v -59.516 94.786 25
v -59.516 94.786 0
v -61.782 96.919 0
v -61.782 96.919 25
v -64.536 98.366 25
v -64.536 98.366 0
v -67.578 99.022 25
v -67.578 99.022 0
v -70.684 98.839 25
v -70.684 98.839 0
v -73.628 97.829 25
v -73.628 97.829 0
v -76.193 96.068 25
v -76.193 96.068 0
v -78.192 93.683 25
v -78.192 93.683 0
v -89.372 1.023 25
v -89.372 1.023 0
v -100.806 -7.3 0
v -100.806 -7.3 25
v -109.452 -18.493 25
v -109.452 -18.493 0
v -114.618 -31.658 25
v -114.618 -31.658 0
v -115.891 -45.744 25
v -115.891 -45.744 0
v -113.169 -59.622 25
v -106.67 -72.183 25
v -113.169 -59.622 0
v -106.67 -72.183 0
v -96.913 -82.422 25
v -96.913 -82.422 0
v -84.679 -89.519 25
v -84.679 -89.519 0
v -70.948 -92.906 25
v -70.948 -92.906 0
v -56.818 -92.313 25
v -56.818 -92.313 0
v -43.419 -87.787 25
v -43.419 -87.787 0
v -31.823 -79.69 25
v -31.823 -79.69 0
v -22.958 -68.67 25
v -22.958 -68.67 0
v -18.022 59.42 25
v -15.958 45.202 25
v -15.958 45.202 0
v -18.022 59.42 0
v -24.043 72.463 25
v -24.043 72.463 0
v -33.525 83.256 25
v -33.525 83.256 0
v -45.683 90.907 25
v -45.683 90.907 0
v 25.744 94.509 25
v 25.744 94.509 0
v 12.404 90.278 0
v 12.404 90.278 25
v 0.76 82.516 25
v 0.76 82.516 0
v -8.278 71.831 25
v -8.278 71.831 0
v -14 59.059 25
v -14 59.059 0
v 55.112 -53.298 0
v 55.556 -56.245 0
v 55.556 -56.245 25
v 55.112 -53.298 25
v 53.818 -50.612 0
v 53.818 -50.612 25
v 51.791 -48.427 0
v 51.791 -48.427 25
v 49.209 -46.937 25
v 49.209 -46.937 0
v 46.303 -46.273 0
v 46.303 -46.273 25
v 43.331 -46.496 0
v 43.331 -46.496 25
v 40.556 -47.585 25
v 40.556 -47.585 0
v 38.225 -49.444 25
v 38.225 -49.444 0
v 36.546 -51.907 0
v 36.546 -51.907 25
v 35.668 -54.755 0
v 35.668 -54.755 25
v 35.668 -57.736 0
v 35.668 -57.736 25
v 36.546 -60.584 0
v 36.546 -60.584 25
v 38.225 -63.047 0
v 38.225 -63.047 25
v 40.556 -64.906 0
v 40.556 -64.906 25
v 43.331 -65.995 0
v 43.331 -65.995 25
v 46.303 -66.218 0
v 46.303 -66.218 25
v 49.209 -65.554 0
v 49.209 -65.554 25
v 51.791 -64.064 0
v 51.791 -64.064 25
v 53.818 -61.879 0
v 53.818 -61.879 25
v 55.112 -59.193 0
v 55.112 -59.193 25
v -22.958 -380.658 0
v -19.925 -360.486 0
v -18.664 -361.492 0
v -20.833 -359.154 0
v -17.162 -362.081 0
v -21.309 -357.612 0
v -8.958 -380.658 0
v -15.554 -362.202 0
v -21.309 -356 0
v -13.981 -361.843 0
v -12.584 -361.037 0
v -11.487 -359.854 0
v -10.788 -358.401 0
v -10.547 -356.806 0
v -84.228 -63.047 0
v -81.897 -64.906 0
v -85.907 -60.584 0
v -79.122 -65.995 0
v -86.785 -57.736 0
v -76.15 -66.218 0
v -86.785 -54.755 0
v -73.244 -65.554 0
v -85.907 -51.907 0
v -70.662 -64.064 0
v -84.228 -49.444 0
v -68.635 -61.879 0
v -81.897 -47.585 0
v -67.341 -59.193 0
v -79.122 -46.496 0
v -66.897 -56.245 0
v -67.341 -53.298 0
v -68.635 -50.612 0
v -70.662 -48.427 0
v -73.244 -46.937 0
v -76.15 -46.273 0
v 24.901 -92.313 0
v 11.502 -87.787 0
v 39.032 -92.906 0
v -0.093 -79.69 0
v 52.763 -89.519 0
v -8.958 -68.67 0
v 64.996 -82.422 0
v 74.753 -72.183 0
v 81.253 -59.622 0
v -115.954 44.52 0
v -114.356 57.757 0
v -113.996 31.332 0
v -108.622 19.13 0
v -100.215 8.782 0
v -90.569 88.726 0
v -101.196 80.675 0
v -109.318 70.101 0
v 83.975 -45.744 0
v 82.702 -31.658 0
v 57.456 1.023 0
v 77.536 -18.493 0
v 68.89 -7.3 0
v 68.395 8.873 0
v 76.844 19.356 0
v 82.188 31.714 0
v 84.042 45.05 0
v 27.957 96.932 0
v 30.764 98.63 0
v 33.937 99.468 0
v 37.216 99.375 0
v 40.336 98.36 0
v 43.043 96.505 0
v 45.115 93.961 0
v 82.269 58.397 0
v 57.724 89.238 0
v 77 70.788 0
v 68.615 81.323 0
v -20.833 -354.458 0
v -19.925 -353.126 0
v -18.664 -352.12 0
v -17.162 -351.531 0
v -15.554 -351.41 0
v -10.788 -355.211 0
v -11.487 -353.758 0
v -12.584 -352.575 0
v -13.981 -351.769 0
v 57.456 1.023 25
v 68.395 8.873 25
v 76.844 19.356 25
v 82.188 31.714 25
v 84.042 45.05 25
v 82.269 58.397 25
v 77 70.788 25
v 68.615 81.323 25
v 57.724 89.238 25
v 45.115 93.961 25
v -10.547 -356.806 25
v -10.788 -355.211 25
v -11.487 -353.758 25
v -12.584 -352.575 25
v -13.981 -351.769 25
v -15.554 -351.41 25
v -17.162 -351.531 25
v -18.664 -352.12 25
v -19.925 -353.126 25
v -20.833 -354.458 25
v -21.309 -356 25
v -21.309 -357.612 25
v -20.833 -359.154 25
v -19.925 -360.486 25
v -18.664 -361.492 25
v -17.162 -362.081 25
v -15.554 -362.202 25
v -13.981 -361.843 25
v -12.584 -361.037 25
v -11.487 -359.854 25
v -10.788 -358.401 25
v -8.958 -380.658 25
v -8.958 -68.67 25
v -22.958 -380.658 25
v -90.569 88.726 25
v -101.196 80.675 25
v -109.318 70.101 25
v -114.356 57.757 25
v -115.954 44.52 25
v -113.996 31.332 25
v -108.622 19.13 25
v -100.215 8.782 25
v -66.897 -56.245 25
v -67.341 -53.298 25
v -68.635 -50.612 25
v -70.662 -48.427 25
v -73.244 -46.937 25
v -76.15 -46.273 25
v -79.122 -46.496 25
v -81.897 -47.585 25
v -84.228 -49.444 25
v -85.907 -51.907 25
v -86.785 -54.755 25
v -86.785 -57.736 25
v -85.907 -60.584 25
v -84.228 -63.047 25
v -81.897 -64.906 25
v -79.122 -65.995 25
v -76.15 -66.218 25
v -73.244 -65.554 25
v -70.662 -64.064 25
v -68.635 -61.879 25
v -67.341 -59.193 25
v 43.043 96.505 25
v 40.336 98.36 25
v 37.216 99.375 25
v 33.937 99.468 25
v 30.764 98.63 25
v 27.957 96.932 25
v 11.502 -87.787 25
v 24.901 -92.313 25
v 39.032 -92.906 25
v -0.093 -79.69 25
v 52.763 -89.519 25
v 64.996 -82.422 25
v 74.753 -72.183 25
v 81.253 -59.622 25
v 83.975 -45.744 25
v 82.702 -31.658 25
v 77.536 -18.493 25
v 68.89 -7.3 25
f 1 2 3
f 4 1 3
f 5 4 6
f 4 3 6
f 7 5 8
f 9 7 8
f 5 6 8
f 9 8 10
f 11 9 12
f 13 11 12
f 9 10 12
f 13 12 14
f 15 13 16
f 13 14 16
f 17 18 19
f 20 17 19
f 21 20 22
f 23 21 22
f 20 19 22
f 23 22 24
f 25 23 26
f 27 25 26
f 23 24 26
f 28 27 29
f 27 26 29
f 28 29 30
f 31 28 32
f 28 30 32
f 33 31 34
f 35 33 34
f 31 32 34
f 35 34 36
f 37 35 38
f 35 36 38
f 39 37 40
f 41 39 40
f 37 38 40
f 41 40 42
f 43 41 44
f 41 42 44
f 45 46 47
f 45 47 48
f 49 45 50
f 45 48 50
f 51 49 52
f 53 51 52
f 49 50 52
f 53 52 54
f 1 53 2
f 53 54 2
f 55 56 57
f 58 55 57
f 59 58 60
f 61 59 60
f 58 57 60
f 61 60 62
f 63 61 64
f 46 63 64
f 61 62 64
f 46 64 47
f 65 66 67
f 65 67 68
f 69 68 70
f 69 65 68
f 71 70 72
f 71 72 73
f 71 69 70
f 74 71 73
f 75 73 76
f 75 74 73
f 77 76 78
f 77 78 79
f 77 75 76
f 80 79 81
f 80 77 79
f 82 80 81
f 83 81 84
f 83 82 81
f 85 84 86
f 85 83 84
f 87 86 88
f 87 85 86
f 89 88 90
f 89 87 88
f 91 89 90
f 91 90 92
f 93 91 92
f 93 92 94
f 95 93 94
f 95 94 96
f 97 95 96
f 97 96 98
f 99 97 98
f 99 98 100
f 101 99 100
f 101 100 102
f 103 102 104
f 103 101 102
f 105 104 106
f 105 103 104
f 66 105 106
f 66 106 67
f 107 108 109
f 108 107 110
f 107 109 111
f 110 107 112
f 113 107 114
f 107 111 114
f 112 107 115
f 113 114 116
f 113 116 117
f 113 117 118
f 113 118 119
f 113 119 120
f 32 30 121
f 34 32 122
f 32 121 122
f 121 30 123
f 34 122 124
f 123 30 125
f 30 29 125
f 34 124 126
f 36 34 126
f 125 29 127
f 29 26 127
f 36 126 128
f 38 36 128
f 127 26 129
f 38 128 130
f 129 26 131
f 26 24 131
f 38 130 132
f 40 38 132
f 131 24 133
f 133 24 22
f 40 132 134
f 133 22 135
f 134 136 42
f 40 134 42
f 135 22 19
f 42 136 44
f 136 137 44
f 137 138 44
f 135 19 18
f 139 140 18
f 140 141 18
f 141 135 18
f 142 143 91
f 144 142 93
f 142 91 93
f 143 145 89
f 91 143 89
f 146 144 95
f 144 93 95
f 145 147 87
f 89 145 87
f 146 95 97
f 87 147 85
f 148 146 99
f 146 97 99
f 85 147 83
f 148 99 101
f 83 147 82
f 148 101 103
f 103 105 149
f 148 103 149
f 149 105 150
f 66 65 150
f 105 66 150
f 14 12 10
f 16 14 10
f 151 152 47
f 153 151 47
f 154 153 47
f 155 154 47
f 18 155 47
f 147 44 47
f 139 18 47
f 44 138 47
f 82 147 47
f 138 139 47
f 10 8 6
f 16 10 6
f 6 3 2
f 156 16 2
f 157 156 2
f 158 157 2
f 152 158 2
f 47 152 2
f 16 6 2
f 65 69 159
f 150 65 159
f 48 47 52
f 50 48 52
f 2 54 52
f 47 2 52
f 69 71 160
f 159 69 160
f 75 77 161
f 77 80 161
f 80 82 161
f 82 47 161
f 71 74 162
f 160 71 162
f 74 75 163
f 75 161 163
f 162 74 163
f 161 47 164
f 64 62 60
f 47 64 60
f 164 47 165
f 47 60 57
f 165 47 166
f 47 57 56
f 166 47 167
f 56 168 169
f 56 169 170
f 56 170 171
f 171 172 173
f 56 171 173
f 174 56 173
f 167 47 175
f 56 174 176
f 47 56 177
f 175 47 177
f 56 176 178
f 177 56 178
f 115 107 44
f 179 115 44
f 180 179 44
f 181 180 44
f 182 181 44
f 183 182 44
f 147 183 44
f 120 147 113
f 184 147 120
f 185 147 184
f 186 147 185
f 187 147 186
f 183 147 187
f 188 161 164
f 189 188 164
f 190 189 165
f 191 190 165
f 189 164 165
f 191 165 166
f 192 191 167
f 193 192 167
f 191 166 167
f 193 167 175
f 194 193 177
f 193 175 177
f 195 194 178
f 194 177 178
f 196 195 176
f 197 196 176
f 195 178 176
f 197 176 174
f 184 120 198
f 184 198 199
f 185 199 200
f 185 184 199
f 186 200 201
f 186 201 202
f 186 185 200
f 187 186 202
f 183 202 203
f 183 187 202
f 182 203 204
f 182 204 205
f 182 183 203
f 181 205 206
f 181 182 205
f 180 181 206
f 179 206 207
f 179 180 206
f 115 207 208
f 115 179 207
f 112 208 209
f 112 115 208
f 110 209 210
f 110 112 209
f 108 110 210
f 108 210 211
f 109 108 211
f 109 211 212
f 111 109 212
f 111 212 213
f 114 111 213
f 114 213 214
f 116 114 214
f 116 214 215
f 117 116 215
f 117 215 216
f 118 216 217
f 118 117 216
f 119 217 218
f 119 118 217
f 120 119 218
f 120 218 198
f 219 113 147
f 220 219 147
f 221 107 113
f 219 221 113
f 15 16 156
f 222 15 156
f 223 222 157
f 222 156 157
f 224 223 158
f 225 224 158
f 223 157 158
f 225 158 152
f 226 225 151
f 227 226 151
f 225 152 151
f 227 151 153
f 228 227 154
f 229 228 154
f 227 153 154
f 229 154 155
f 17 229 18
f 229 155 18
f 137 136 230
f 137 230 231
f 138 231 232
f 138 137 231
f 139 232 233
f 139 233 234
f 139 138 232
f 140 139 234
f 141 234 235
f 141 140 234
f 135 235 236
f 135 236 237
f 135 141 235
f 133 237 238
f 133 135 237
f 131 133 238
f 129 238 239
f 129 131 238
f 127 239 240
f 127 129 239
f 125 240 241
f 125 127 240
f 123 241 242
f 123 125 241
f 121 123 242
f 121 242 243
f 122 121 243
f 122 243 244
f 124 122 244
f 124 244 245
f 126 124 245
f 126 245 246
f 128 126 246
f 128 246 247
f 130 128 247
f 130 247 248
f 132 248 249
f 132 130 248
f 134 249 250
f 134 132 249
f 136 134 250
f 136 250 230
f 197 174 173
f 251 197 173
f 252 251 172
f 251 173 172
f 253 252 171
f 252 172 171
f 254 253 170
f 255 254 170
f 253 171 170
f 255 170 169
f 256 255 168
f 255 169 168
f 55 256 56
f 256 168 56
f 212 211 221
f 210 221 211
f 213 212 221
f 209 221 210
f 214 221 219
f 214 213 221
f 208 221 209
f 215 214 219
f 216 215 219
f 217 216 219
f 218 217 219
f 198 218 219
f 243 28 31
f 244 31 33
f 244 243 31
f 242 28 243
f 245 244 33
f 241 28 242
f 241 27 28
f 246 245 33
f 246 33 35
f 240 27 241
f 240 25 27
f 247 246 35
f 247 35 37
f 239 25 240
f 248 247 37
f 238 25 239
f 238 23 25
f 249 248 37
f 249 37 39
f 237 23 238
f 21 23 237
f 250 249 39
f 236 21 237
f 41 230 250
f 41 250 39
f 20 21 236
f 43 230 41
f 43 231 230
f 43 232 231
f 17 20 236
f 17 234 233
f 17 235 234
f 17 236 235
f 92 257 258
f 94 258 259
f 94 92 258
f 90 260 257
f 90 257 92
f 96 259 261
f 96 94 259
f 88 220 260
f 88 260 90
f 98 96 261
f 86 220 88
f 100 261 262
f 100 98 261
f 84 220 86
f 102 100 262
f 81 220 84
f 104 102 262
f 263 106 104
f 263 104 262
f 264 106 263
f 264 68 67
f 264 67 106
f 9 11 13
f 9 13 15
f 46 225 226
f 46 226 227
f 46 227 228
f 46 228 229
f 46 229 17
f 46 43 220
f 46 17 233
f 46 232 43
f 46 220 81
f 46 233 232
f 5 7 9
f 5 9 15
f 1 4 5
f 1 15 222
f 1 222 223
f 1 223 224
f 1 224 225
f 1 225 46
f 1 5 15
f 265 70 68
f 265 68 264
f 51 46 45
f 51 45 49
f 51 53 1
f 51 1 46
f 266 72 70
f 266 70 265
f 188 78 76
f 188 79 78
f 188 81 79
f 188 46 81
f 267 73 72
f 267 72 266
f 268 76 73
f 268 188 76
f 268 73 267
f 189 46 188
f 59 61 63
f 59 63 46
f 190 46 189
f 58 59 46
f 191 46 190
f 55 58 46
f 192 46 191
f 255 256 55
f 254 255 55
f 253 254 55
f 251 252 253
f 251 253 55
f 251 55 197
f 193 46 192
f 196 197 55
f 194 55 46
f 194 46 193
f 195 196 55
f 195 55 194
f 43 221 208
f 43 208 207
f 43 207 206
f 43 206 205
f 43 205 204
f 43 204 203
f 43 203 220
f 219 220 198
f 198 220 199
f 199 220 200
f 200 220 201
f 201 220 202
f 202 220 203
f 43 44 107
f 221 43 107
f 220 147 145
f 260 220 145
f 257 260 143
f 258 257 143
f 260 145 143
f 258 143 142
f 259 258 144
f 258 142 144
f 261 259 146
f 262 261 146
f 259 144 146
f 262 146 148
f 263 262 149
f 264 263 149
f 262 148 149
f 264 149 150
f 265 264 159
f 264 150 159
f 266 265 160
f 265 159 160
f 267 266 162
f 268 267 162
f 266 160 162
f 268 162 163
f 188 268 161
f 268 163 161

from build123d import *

# Parameters (mm, degrees)
F0_R     = 10
F0_R_2   = 5.4110615761
F1_DEPTH = 25
F2_DEPTH = 25


with BuildPart() as f1:
    # F0 (on Top) → F1 (new body)
    with BuildSketch(Plane.XY):
        with BuildLine():
            Line((-56.9581672003, 45.2024476719), (-15.9581672003, 45.2024476719))
            ThreePointArc((-15.9581672003, 45.2024476719), (-28.3942012079, 78.2016667372), (-59.5161055572, 94.7857093817))
            ThreePointArc((-59.5161055572, 94.7857093817), (-69.1375376467, 99.0362543602), (-78.191763881, 93.6827437957))
            ThreePointArc((-78.191763881, 93.6827437957), (-115.5981273519, 51.1919681993), (-89.3719782194, 1.0233411444))
            ThreePointArc((-89.3719782194, 1.0233411444), (-102.1550099365, -77.6490774294), (-22.9581672003, -68.6704670274))
            ThreePointArc((-22.9581672003, -68.6704670274), (-17.7399133953, -56.3845219384), (-15.9581672003, -43.1557653831))
            Line((-15.9581672003, -43.1557653831), (-56.9581672003, -43.1557653831))
            ThreePointArc((-56.9581672003, -43.1557653831), (-63.322128231, -40.5197264137), (-65.9581672003, -34.1557653831))
            Line((-65.9581672003, -34.1557653831), (-65.9581672003, 36.2024476719))
            ThreePointArc((-65.9581672003, 36.2024476719), (-63.322128231, 42.5664087025), (-56.9581672003, 45.2024476719))
        make_face()
        with Locations((-76.8970996141, -56.245483458)):
            Circle(F0_R, mode=Mode.SUBTRACT)
        with BuildLine():
            Line((25.0418327997, 45.2024476719), (-15.9581672003, 45.2024476719))
            Line((-15.9581672003, 45.2024476719), (-56.9581672003, 45.2024476719))
            ThreePointArc((-56.9581672003, 45.2024476719), (-63.322128231, 42.5664087025), (-65.9581672003, 36.2024476719))
            Line((-65.9581672003, 36.2024476719), (-65.9581672003, -34.1557653831))
            ThreePointArc((-65.9581672003, -34.1557653831), (-63.322128231, -40.5197264137), (-56.9581672003, -43.1557653831))
            Line((-56.9581672003, -43.1557653831), (-15.9581672003, -43.1557653831))
            Line((-15.9581672003, -43.1557653831), (25.0418327997, -43.1557653831))
            ThreePointArc((25.0418327997, -43.1557653831), (31.4057938304, -40.5197264137), (34.0418327997, -34.1557653831))
            Line((34.0418327997, -34.1557653831), (34.0418327997, 36.2024476719))
            ThreePointArc((34.0418327997, 36.2024476719), (31.4057938304, 42.5664087025), (25.0418327997, 45.2024476719))
        make_face()
        with BuildLine():
            ThreePointArc((25.7441905011, 94.5091321303), (-4.1346135706, 77.4911290097), (-15.9581672003, 45.2024476719))
            Line((-15.9581672003, 45.2024476719), (25.0418327997, 45.2024476719))
            ThreePointArc((25.0418327997, 45.2024476719), (31.4057938304, 42.5664087025), (34.0418327997, 36.2024476719))
            Line((34.0418327997, 36.2024476719), (34.0418327997, -34.1557653831))
            ThreePointArc((34.0418327997, -34.1557653831), (31.4057938304, -40.5197264137), (25.0418327997, -43.1557653831))
            Line((25.0418327997, -43.1557653831), (-15.9581672003, -43.1557653831))
            ThreePointArc((-15.9581672003, -43.1557653831), (-14.1764210053, -56.3845219384), (-8.9581672003, -68.6704670274))
            ThreePointArc((-8.9581672003, -68.6704670274), (70.2386755359, -77.6490774294), (57.4556438187, 1.0233411444))
            ThreePointArc((57.4556438187, 1.0233411444), (83.6067922706, 51.7838451407), (45.1150959261, 93.9608607278))
            ThreePointArc((45.1150959261, 93.9608607278), (35.5797605926, 99.5387739728), (25.7441905011, 94.5091321303))
        make_face()
        with Locations((45.5559305847, -56.245483458)):
            Circle(F0_R, mode=Mode.SUBTRACT)
        with BuildLine():
            ThreePointArc((-15.9581672003, -43.1557653831), (-17.7399133953, -56.3845219384), (-22.9581672003, -68.6704670274))
            Line((-22.9581672003, -68.6704670274), (-22.9581672003, -234.5025837421))
            Line((-22.9581672003, -234.5025837421), (-22.9581672003, -380.6582093239))
            Line((-22.9581672003, -380.6582093239), (-8.9581672003, -380.6582093239))
            Line((-8.9581672003, -380.6582093239), (-8.9581672003, -234.5025837421))
            Line((-8.9581672003, -234.5025837421), (-8.9581672003, -68.6704670274))
            ThreePointArc((-8.9581672003, -68.6704670274), (-14.1764210053, -56.3845219384), (-15.9581672003, -43.1557653831))
        make_face()
        with Locations((-15.9581672003, -356.8059802055)):
            Circle(F0_R_2, mode=Mode.SUBTRACT)
    extrude(amount=F1_DEPTH)

    # F0 (on Top) → F2 (join)
    with BuildSketch(Plane.XY):
        with BuildLine():
            Line((-56.9581672003, 45.2024476719), (-15.9581672003, 45.2024476719))
            ThreePointArc((-15.9581672003, 45.2024476719), (-28.3942012079, 78.2016667372), (-59.5161055572, 94.7857093817))
            ThreePointArc((-59.5161055572, 94.7857093817), (-69.1375376467, 99.0362543602), (-78.191763881, 93.6827437957))
            ThreePointArc((-78.191763881, 93.6827437957), (-115.5981273519, 51.1919681993), (-89.3719782194, 1.0233411444))
            ThreePointArc((-89.3719782194, 1.0233411444), (-102.1550099365, -77.6490774294), (-22.9581672003, -68.6704670274))
            ThreePointArc((-22.9581672003, -68.6704670274), (-17.7399133953, -56.3845219384), (-15.9581672003, -43.1557653831))
            Line((-15.9581672003, -43.1557653831), (-56.9581672003, -43.1557653831))
            ThreePointArc((-56.9581672003, -43.1557653831), (-63.322128231, -40.5197264137), (-65.9581672003, -34.1557653831))
            Line((-65.9581672003, -34.1557653831), (-65.9581672003, 36.2024476719))
            ThreePointArc((-65.9581672003, 36.2024476719), (-63.322128231, 42.5664087025), (-56.9581672003, 45.2024476719))
        make_face()
        with Locations((-76.8970996141, -56.245483458)):
            Circle(F0_R, mode=Mode.SUBTRACT)
        with BuildLine():
            Line((25.0418327997, 45.2024476719), (-15.9581672003, 45.2024476719))
            Line((-15.9581672003, 45.2024476719), (-56.9581672003, 45.2024476719))
            ThreePointArc((-56.9581672003, 45.2024476719), (-63.322128231, 42.5664087025), (-65.9581672003, 36.2024476719))
            Line((-65.9581672003, 36.2024476719), (-65.9581672003, -34.1557653831))
            ThreePointArc((-65.9581672003, -34.1557653831), (-63.322128231, -40.5197264137), (-56.9581672003, -43.1557653831))
            Line((-56.9581672003, -43.1557653831), (-15.9581672003, -43.1557653831))
            Line((-15.9581672003, -43.1557653831), (25.0418327997, -43.1557653831))
            ThreePointArc((25.0418327997, -43.1557653831), (31.4057938304, -40.5197264137), (34.0418327997, -34.1557653831))
            Line((34.0418327997, -34.1557653831), (34.0418327997, 36.2024476719))
            ThreePointArc((34.0418327997, 36.2024476719), (31.4057938304, 42.5664087025), (25.0418327997, 45.2024476719))
        make_face()
        with BuildLine():
            ThreePointArc((25.7441905011, 94.5091321303), (-4.1346135706, 77.4911290097), (-15.9581672003, 45.2024476719))
            Line((-15.9581672003, 45.2024476719), (25.0418327997, 45.2024476719))
            ThreePointArc((25.0418327997, 45.2024476719), (31.4057938304, 42.5664087025), (34.0418327997, 36.2024476719))
            Line((34.0418327997, 36.2024476719), (34.0418327997, -34.1557653831))
            ThreePointArc((34.0418327997, -34.1557653831), (31.4057938304, -40.5197264137), (25.0418327997, -43.1557653831))
            Line((25.0418327997, -43.1557653831), (-15.9581672003, -43.1557653831))
            ThreePointArc((-15.9581672003, -43.1557653831), (-14.1764210053, -56.3845219384), (-8.9581672003, -68.6704670274))
            ThreePointArc((-8.9581672003, -68.6704670274), (70.2386755359, -77.6490774294), (57.4556438187, 1.0233411444))
            ThreePointArc((57.4556438187, 1.0233411444), (83.6067922706, 51.7838451407), (45.1150959261, 93.9608607278))
            ThreePointArc((45.1150959261, 93.9608607278), (35.5797605926, 99.5387739728), (25.7441905011, 94.5091321303))
        make_face()
        with Locations((45.5559305847, -56.245483458)):
            Circle(F0_R, mode=Mode.SUBTRACT)
        with BuildLine():
            ThreePointArc((-15.9581672003, -43.1557653831), (-17.7399133953, -56.3845219384), (-22.9581672003, -68.6704670274))
            Line((-22.9581672003, -68.6704670274), (-22.9581672003, -234.5025837421))
            Line((-22.9581672003, -234.5025837421), (-22.9581672003, -380.6582093239))
            Line((-22.9581672003, -380.6582093239), (-8.9581672003, -380.6582093239))
            Line((-8.9581672003, -380.6582093239), (-8.9581672003, -234.5025837421))
            Line((-8.9581672003, -234.5025837421), (-8.9581672003, -68.6704670274))
            ThreePointArc((-8.9581672003, -68.6704670274), (-14.1764210053, -56.3845219384), (-15.9581672003, -43.1557653831))
        make_face()
        with Locations((-15.9581672003, -356.8059802055)):
            Circle(F0_R_2, mode=Mode.SUBTRACT)
    extrude(amount=F2_DEPTH)


solid = f1.part
